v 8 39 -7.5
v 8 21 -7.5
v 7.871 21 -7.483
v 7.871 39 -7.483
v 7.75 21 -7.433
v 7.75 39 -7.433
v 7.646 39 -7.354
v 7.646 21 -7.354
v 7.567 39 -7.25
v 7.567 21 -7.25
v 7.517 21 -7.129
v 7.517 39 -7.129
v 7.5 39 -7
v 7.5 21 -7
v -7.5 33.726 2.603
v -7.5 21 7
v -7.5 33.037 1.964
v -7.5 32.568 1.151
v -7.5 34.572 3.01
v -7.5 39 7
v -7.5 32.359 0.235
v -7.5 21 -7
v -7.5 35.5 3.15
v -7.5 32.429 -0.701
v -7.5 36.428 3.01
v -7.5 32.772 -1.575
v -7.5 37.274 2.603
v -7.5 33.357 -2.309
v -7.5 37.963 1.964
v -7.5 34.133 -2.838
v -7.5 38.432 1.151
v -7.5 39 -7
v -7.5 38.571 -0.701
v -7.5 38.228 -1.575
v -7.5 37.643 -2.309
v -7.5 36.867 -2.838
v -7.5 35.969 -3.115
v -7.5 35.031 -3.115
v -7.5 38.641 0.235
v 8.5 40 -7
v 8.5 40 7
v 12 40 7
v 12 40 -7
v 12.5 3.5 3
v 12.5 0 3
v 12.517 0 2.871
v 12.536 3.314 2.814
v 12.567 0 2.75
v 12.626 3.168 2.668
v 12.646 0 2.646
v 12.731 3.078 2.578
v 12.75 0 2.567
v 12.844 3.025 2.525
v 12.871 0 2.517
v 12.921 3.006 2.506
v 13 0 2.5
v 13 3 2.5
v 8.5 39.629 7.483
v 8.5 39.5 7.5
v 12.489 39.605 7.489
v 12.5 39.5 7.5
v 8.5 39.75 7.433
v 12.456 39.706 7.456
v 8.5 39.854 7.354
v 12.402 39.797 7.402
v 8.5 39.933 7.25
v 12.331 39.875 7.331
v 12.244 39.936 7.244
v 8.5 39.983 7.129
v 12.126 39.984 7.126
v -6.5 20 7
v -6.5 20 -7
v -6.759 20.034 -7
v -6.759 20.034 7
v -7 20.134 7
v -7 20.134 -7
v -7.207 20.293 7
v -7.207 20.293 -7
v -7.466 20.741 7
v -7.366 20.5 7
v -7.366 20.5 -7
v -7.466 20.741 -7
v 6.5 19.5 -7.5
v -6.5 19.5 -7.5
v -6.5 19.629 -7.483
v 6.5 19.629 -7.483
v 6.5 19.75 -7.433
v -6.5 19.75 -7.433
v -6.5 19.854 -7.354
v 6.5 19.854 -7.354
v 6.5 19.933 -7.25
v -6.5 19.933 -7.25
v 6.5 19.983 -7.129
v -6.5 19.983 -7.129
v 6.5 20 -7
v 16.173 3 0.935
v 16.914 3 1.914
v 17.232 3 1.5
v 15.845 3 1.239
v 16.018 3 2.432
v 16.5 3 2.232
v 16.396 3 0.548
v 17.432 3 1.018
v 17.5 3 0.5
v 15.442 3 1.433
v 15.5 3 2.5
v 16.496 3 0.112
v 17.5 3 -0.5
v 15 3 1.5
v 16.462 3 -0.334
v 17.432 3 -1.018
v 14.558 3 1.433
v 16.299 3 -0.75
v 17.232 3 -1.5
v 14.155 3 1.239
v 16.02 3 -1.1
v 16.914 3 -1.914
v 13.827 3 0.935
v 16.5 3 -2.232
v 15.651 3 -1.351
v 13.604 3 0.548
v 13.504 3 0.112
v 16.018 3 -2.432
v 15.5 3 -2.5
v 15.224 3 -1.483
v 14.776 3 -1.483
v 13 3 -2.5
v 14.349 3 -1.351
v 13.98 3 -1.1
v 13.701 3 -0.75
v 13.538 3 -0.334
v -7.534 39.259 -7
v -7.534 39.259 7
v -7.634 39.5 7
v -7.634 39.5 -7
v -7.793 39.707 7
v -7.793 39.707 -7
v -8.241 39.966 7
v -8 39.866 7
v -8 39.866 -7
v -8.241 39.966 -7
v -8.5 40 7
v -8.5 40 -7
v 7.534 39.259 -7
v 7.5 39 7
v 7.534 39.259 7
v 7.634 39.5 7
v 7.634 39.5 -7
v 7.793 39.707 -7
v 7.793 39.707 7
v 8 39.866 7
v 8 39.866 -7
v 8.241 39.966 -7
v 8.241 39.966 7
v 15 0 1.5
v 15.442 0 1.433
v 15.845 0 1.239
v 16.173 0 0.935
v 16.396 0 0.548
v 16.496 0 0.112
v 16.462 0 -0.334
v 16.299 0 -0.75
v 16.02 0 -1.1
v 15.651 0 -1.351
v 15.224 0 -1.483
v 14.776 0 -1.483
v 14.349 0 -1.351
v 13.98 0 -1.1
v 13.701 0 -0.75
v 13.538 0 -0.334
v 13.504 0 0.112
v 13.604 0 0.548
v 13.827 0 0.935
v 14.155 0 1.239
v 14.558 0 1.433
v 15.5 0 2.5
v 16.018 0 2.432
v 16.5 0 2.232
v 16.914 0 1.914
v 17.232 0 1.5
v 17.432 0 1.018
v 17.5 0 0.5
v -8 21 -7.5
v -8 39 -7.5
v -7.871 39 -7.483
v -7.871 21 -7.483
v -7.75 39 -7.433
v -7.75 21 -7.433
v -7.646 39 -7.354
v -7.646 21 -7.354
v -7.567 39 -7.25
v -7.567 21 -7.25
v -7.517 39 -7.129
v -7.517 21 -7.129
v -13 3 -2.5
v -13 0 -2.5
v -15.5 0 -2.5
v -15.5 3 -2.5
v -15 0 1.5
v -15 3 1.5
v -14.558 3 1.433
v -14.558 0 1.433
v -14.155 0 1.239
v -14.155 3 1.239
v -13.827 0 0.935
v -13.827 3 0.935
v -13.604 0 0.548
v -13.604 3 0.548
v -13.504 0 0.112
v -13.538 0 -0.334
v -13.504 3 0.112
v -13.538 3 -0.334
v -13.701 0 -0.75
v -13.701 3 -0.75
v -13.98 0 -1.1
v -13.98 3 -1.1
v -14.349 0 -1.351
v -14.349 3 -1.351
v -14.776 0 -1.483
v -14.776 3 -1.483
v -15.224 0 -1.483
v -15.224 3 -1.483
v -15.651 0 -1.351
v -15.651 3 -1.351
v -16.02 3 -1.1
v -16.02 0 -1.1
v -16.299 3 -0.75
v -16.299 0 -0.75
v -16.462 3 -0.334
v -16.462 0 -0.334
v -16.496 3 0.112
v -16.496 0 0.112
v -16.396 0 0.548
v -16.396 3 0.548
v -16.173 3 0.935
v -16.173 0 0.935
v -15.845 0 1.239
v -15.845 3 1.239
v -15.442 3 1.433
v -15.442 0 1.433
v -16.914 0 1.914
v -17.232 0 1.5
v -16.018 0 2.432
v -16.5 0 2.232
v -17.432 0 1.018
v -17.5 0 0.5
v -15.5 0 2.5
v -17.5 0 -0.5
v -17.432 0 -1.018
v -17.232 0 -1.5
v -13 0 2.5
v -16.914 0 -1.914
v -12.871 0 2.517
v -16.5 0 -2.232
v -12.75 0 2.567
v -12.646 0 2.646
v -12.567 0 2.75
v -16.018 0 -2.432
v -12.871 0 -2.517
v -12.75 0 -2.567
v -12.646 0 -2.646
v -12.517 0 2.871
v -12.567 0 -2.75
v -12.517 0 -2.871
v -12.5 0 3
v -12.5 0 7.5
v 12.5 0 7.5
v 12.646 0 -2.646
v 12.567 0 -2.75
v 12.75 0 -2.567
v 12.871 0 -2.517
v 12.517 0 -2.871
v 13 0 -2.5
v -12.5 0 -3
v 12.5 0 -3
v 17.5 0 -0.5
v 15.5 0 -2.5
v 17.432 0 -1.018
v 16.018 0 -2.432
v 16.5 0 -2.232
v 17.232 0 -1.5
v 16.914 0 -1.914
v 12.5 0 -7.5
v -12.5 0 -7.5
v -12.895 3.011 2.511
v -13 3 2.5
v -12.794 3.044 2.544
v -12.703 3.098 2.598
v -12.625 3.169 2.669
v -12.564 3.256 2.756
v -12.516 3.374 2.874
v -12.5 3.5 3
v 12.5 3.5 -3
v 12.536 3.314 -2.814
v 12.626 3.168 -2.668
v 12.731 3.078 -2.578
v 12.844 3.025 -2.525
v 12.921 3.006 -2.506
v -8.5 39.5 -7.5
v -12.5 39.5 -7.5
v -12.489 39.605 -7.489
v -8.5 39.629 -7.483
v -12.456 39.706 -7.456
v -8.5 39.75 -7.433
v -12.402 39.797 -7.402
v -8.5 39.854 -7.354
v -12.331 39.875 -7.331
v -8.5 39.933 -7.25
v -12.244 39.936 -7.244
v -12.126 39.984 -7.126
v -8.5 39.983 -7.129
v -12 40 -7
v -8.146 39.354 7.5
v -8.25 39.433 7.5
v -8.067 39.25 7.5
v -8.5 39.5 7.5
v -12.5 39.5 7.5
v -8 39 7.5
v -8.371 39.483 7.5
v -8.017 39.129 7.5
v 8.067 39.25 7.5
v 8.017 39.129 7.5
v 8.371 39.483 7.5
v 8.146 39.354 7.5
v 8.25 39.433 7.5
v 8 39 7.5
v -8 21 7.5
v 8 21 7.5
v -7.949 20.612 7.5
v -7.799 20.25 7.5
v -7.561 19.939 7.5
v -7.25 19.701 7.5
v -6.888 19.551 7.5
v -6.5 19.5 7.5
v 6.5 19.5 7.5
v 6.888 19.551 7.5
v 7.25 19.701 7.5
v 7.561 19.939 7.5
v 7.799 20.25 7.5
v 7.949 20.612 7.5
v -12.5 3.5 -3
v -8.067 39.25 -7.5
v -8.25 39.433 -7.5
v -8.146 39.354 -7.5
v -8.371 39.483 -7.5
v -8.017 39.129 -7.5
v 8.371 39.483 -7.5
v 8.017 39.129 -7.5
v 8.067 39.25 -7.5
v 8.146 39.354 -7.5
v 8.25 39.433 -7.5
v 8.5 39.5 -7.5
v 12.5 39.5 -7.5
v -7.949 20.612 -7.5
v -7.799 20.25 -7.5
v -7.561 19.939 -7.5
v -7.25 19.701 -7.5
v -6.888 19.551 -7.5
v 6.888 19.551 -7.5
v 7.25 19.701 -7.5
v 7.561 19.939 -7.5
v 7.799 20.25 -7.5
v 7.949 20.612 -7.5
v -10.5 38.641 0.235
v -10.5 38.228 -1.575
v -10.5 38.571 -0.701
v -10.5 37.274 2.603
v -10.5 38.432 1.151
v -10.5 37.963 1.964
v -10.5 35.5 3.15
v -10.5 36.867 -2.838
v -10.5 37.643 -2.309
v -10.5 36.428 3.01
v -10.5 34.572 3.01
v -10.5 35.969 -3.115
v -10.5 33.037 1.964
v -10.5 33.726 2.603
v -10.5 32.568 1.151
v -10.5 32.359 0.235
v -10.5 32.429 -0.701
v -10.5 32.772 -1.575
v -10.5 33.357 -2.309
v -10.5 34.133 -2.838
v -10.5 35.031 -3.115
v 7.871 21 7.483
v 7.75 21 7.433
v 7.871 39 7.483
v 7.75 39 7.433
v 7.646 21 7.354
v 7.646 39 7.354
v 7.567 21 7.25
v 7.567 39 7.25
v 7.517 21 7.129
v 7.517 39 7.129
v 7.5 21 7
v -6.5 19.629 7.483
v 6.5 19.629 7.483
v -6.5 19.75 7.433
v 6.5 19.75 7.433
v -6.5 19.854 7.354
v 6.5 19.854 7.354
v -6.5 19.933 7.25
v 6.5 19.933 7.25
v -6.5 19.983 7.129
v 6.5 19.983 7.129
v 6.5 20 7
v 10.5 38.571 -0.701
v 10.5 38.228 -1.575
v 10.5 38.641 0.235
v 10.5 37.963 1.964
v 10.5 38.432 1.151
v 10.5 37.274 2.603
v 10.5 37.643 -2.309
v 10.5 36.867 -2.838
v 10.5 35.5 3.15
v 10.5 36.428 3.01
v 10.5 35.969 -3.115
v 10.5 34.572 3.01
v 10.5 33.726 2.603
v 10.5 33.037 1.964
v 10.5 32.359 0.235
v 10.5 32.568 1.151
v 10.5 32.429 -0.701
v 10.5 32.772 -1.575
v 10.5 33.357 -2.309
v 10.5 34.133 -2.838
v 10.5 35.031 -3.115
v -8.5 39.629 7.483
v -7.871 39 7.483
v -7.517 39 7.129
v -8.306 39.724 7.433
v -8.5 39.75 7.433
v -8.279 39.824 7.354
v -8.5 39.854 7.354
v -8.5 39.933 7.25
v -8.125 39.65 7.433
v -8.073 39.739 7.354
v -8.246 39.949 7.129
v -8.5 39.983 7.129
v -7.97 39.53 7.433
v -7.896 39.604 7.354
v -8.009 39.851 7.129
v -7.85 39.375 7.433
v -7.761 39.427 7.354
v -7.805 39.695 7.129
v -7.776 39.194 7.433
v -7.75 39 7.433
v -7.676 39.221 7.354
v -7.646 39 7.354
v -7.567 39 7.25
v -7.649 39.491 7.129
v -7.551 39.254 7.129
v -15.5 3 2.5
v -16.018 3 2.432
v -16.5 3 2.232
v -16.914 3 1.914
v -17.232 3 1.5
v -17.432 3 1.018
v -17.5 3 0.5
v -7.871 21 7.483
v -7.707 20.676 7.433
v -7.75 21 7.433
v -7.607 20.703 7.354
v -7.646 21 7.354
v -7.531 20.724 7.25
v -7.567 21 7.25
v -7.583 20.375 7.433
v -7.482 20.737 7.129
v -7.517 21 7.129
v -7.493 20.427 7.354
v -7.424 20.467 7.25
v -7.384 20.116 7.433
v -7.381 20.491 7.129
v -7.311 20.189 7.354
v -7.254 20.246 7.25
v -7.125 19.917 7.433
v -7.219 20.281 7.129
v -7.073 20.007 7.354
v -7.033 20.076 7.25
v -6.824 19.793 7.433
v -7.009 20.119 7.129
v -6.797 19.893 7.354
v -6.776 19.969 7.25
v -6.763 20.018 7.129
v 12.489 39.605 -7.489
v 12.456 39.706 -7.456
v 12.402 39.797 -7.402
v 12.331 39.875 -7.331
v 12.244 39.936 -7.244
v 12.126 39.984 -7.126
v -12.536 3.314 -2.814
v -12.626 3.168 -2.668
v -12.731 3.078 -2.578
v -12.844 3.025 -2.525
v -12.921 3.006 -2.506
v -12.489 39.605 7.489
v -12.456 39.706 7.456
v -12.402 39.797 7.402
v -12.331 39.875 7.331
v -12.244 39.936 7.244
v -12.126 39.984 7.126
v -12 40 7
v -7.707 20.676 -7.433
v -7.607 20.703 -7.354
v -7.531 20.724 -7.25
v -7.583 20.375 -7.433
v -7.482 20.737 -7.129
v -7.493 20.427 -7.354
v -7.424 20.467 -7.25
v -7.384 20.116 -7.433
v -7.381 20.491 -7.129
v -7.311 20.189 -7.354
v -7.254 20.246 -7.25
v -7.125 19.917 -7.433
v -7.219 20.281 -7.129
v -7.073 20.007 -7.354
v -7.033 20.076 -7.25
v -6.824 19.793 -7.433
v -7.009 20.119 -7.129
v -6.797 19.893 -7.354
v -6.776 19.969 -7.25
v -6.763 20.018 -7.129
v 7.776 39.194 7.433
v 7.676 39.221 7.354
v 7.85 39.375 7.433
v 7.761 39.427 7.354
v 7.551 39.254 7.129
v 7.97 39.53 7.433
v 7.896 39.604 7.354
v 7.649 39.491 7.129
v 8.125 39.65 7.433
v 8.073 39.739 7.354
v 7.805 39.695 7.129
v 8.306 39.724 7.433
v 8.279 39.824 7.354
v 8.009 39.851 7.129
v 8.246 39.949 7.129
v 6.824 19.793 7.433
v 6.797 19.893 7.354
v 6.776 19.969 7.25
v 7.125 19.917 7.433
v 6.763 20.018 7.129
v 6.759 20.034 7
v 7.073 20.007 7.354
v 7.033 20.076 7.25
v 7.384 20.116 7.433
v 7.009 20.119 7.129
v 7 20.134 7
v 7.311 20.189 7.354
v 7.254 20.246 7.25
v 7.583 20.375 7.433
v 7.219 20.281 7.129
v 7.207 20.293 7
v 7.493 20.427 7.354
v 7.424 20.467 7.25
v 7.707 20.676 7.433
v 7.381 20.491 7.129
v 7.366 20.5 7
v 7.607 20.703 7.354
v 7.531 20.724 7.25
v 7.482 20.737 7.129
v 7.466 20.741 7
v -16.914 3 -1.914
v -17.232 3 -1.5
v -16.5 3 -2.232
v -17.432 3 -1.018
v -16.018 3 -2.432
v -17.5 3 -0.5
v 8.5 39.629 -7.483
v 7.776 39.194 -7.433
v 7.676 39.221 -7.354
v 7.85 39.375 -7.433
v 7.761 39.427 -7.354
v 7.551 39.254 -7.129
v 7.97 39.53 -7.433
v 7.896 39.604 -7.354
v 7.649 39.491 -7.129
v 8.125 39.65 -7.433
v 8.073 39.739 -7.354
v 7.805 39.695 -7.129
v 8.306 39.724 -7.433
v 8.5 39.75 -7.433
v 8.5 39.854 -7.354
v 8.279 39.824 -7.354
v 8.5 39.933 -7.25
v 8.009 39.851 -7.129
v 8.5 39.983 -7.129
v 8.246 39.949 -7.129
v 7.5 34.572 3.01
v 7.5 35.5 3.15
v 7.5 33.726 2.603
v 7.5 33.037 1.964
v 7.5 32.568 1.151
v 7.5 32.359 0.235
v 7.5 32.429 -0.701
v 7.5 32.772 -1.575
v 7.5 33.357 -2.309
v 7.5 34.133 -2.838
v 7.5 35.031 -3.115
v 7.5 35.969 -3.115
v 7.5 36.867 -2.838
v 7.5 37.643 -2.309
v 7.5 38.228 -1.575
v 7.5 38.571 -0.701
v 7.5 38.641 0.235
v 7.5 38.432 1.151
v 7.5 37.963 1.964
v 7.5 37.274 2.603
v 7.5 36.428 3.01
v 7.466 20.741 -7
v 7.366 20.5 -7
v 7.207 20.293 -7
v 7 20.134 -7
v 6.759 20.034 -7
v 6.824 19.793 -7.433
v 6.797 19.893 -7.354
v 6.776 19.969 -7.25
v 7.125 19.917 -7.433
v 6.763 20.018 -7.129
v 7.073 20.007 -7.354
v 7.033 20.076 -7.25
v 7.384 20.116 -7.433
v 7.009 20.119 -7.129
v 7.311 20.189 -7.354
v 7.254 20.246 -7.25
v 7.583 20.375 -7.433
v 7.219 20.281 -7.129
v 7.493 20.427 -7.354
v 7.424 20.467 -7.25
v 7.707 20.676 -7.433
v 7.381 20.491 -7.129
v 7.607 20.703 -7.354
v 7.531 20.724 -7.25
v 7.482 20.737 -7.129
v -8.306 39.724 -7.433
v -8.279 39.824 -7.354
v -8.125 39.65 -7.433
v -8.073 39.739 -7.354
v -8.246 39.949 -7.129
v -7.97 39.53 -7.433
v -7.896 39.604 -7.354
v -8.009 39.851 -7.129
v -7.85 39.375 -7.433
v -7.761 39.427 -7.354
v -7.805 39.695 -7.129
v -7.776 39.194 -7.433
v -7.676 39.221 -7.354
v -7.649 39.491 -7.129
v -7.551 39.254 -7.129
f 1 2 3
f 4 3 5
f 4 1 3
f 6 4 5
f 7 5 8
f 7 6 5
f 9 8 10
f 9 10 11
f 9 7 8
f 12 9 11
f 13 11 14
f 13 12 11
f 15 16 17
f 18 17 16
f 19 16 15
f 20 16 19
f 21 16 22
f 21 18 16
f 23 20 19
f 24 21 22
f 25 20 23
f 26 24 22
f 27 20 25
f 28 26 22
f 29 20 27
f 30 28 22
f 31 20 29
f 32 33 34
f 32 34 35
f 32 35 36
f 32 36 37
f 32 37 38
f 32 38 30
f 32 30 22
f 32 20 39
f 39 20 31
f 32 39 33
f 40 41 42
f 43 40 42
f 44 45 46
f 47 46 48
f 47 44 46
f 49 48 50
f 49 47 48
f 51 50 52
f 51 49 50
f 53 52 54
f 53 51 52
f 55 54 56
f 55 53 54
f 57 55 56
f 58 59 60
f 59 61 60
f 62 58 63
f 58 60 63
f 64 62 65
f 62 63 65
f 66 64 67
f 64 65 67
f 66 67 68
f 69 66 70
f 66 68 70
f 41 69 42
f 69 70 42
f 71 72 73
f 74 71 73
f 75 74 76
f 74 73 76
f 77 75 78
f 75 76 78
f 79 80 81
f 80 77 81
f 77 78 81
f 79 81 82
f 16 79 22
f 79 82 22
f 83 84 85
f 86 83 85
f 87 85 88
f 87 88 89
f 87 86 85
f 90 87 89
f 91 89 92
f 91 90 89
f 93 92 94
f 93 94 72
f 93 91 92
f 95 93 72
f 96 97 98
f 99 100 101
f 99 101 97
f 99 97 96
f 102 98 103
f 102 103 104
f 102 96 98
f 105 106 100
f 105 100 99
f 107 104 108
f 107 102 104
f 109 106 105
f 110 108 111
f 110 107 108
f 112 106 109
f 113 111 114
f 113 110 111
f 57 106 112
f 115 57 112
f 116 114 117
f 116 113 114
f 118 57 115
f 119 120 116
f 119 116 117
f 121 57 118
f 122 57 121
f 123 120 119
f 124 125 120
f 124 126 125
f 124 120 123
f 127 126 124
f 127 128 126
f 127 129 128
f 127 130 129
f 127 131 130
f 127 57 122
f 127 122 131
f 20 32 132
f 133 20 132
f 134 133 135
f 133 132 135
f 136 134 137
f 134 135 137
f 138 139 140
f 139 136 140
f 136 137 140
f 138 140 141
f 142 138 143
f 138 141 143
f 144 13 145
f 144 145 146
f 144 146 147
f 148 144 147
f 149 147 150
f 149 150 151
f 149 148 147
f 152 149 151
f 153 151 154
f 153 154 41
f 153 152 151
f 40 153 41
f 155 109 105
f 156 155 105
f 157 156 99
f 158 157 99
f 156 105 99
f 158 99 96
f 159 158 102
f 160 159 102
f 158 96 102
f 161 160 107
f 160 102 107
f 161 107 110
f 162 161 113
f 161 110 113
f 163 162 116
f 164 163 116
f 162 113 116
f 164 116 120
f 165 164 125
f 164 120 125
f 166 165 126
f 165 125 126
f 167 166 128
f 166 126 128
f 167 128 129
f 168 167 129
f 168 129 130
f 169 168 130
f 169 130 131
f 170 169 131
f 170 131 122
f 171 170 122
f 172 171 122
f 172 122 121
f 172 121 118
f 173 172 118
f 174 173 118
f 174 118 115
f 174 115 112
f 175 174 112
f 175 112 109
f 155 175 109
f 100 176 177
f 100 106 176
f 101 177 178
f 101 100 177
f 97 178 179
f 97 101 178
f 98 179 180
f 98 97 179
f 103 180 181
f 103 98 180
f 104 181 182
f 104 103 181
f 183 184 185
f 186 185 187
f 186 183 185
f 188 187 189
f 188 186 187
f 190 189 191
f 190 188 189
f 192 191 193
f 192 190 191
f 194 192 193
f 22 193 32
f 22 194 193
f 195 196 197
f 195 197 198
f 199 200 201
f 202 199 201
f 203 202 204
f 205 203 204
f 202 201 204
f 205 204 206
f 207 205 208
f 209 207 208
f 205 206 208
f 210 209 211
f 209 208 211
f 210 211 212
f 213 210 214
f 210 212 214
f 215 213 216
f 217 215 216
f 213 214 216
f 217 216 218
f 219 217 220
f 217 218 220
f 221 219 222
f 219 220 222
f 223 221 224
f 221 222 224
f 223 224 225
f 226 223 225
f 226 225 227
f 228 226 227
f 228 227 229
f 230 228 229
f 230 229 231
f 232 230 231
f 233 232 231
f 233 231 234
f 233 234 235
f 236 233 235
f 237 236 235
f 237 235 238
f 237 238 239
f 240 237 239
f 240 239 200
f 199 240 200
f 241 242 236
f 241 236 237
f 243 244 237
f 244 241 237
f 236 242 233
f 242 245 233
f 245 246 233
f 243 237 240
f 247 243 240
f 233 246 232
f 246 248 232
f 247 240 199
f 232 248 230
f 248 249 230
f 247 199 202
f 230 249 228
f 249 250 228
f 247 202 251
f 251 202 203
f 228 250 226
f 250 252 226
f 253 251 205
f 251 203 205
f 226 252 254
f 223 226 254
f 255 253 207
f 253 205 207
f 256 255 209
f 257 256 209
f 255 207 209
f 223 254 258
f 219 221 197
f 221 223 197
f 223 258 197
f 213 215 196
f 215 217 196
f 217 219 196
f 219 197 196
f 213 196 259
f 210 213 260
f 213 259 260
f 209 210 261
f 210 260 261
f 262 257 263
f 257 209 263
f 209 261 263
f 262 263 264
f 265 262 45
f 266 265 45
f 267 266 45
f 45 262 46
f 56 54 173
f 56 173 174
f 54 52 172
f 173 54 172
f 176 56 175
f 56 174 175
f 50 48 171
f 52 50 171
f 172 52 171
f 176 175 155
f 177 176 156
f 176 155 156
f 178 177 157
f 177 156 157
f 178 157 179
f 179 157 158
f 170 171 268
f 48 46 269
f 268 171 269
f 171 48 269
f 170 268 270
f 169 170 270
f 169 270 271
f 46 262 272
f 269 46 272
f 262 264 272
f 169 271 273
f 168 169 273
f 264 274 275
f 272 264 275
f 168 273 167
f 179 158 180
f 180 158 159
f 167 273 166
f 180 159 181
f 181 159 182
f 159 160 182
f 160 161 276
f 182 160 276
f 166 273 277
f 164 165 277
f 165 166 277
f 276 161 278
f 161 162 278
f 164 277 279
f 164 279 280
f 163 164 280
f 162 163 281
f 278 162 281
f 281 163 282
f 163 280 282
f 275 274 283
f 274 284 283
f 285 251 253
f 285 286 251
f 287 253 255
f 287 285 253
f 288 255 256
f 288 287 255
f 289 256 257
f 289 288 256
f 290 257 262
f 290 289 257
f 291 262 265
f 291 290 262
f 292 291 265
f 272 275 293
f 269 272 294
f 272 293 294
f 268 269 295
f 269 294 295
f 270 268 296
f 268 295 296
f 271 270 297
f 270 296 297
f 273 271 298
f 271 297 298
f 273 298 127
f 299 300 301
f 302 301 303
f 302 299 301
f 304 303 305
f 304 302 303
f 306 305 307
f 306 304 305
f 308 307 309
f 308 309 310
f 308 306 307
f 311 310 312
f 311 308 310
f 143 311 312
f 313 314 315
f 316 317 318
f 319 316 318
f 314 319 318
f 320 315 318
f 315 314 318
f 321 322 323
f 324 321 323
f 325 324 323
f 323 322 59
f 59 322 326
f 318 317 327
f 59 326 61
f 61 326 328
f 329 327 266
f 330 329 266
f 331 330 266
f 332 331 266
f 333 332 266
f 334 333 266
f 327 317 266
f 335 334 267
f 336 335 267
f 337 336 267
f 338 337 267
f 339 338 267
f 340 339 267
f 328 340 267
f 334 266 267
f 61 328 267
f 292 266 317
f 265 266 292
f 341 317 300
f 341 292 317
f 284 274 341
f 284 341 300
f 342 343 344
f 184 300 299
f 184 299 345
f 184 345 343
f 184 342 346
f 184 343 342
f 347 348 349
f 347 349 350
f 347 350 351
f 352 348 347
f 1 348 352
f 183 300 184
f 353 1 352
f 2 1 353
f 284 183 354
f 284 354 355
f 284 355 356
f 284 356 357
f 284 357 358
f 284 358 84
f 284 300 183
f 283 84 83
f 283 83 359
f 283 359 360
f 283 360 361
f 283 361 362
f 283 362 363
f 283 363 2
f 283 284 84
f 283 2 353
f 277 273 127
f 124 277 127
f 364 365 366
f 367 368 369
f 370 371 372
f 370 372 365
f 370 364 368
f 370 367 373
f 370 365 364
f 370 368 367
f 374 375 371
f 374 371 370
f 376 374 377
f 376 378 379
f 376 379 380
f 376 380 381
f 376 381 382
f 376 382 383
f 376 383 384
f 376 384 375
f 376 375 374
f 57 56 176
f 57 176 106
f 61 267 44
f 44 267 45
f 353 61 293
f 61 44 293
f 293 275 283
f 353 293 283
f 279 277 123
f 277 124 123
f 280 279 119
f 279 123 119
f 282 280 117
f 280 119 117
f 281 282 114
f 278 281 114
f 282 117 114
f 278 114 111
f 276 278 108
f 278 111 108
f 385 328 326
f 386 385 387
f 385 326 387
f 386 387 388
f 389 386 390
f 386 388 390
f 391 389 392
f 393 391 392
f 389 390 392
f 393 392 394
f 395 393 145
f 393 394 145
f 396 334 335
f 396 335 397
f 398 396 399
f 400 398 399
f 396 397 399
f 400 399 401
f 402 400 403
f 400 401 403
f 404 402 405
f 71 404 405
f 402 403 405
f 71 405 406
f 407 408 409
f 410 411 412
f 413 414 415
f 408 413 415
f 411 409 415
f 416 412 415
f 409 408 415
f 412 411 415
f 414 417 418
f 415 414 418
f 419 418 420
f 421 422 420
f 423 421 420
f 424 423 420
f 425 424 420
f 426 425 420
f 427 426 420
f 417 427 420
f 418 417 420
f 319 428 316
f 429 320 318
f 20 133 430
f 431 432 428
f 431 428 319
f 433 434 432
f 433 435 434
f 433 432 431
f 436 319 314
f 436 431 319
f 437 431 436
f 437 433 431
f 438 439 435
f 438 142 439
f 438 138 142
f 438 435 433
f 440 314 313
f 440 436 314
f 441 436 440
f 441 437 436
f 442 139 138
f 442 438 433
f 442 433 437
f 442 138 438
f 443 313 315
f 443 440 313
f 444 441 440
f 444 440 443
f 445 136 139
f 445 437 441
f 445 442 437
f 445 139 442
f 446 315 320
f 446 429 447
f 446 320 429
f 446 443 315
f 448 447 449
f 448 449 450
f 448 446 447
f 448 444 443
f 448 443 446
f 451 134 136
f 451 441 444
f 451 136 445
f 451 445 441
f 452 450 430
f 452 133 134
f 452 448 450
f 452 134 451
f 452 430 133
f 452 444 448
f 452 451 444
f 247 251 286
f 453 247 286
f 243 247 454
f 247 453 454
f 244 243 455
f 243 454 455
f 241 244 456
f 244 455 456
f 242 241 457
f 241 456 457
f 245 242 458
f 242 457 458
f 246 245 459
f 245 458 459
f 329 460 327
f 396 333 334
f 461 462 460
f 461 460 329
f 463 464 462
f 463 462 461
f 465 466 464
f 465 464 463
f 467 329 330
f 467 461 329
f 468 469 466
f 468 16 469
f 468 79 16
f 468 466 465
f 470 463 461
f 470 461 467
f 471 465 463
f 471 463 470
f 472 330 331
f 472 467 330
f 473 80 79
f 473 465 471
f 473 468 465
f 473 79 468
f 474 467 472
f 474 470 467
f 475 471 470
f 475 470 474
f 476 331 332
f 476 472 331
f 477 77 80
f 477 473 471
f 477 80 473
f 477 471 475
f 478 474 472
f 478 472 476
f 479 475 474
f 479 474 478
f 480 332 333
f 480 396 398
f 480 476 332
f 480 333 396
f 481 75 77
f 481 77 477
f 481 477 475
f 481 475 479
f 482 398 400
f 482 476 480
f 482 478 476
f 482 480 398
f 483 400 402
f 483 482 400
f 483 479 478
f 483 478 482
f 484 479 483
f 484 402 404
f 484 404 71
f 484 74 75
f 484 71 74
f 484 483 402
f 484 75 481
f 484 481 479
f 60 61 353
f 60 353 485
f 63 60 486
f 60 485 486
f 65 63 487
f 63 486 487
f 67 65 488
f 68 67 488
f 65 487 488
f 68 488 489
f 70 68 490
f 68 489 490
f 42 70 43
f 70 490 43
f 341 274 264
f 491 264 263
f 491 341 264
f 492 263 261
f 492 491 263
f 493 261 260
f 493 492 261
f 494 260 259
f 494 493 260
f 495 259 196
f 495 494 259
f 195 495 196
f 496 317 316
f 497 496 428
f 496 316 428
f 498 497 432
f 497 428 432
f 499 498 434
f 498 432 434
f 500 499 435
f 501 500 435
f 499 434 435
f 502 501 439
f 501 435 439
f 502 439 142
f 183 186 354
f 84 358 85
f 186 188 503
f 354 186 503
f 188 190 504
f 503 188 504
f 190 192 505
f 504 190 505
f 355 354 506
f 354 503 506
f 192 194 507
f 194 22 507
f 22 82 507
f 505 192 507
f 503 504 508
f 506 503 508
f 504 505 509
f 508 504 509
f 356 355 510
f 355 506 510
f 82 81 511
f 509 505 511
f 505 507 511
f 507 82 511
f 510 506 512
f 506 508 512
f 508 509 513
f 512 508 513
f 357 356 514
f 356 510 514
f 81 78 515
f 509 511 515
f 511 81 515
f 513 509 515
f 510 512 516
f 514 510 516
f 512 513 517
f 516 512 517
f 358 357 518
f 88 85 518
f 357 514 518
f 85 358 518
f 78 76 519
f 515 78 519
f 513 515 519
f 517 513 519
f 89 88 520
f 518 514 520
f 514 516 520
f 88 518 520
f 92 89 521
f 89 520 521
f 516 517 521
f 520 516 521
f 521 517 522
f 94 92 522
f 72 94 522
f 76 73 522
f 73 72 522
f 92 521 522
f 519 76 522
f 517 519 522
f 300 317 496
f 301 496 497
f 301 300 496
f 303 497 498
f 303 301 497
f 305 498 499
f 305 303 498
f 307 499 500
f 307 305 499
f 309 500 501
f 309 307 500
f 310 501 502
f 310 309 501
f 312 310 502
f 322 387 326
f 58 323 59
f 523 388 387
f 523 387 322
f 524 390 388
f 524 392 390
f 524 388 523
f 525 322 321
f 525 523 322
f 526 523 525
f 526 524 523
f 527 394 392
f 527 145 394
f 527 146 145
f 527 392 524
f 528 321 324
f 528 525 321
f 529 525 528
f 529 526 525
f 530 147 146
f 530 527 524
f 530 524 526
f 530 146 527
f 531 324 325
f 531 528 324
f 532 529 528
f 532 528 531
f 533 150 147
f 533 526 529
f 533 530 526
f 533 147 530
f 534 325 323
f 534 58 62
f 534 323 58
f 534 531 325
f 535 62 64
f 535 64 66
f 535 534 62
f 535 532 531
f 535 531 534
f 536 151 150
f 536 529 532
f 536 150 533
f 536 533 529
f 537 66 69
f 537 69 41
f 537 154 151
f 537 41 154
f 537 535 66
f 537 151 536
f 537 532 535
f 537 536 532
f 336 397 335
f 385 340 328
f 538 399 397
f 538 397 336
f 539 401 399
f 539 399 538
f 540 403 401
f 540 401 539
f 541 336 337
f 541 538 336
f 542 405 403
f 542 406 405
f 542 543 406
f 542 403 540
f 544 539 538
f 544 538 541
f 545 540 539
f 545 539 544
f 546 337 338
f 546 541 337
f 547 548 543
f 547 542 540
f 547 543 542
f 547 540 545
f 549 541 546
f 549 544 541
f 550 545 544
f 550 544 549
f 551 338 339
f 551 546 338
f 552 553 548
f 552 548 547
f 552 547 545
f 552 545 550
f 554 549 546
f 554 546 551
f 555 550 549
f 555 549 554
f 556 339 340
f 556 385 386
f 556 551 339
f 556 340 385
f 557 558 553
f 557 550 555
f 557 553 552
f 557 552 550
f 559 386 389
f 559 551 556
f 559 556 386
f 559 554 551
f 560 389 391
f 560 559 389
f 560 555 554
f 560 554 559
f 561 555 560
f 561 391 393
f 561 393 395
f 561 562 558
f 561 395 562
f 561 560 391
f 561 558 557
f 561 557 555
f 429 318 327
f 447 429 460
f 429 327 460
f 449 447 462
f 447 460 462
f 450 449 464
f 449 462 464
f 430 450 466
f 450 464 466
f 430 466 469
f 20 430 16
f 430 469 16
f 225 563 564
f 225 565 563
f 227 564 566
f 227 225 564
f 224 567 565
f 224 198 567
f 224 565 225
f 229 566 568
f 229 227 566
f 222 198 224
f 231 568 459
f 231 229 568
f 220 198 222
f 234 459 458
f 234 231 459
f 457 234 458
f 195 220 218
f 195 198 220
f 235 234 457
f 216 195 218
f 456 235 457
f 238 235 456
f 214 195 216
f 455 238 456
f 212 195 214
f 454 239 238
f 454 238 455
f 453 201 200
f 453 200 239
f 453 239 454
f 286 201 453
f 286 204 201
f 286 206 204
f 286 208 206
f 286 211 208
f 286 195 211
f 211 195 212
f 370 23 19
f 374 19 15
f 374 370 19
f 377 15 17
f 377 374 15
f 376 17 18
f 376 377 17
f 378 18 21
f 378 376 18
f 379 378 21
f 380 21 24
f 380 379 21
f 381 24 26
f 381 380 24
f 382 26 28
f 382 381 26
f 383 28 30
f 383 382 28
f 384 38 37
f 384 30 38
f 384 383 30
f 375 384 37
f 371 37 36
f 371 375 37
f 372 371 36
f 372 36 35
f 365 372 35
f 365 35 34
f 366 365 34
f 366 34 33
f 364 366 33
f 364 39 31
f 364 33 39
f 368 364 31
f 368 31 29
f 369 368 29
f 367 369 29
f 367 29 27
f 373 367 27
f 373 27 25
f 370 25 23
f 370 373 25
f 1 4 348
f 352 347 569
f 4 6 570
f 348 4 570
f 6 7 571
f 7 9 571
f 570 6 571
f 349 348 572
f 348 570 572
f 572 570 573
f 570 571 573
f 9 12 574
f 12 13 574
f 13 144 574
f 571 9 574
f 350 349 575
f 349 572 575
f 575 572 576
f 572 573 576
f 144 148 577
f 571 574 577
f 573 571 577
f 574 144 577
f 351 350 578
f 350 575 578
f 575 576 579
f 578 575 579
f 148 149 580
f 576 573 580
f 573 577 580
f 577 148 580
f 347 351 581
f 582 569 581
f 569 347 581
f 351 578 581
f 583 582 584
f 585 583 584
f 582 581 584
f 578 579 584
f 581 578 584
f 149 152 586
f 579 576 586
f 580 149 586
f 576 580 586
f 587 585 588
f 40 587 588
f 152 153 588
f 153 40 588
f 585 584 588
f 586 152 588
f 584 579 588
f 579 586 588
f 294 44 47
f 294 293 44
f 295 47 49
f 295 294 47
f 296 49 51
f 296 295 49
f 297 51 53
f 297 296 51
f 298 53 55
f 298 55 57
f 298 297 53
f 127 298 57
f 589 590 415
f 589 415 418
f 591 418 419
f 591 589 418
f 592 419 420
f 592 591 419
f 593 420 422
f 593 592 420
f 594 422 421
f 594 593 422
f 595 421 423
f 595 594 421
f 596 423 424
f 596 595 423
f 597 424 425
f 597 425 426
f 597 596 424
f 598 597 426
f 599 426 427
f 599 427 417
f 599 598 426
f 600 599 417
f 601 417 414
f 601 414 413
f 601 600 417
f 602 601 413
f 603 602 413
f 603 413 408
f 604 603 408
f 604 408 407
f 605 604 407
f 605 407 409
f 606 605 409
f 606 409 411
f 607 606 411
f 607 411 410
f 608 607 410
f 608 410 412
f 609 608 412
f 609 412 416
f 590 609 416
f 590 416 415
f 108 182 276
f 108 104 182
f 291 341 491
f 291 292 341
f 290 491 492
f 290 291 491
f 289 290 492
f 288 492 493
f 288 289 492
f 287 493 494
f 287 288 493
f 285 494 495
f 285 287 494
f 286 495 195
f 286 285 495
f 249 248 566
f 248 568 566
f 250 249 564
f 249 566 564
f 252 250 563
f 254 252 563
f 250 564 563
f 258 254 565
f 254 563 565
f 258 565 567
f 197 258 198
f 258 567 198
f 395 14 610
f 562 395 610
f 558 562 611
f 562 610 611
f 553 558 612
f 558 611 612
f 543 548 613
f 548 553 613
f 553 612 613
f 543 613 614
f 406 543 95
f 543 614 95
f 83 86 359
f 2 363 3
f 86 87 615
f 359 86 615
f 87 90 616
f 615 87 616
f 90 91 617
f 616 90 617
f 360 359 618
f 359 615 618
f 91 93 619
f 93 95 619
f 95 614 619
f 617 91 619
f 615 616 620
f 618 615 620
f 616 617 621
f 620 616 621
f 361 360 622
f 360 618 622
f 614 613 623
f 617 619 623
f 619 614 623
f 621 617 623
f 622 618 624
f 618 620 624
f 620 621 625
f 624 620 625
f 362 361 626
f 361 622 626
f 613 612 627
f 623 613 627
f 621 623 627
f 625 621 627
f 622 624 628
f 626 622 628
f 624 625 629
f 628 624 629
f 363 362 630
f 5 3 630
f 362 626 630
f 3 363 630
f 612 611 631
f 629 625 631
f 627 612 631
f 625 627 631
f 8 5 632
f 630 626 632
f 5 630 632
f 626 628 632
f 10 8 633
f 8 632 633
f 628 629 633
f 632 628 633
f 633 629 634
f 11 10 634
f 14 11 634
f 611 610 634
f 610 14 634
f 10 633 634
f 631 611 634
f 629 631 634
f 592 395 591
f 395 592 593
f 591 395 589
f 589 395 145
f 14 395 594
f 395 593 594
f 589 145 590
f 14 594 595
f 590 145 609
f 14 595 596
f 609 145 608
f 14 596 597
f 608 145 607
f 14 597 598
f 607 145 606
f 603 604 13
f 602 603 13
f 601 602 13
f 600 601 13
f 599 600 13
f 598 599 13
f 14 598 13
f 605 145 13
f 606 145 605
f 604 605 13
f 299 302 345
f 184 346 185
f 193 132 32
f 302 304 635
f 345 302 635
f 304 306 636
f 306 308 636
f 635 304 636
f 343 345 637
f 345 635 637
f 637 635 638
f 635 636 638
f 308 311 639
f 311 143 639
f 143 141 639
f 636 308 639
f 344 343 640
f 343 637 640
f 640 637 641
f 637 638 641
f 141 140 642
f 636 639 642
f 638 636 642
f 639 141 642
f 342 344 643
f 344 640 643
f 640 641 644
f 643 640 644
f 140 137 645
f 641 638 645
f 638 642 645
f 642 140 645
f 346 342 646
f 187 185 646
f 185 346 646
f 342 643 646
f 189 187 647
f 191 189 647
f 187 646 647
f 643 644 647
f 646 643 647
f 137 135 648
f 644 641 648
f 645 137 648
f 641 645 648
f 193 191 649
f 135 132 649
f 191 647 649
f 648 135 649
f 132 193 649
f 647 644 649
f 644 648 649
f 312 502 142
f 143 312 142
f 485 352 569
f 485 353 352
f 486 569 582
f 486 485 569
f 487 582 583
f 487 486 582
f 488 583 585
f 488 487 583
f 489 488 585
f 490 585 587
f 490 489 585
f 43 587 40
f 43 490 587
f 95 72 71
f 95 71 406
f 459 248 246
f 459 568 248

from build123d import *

# Parameters (mm, degrees)
CROQUIS2_W                 = 25
CROQUIS2_H                 = 15
SALIENTE_EXTRUIR1_DEPTH    = 40
CROQUIS3_W                 = 15
CROQUIS3_H                 = 15
CORTAR_EXTRUIR1_DEPTH      = 20
REDONDEO1_R                = 1
REDONDEO2_R                = 1
CORTAR_EXTRUIR2_DEPTH      = 18
CORTAR_EXTRUIR2_DEPTH_BACK = 3
CROQUIS4_R                 = 3.15
CROQUIS6_W                 = 5
CROQUIS6_H                 = 3
SALIENTE_EXTRUIR2_DEPTH    = 5
REDONDEO3_R                = 2
CROQUIS8_R                 = 1.5
CORTAR_EXTRUIR3_DEPTH      = 15
CROQUIS9_W                 = 5
CROQUIS9_H                 = 3
SALIENTE_EXTRUIR3_DEPTH    = 5
CORTAR_EXTRUIR4_REACH      = 43.611
CROQUIS10_R                = 1.5
REDONDEO4_R                = 2
REDONDEO5_R                = 0.5
REDONDEO6_R                = 0.5


with BuildPart() as part:
    # Croquis2 → Saliente-Extruir1 (new body)
    with BuildSketch(Plane(origin=(0, 0, 0), x_dir=(1, 0, 0), z_dir=(0, 1, 0))):
        Rectangle(CROQUIS2_W, CROQUIS2_H)
    extrude(amount=SALIENTE_EXTRUIR1_DEPTH)

    # Croquis3 → Cortar-Extruir1 (cut)
    with BuildSketch(Plane(origin=(0, 40, 0), x_dir=(1, 0, 0), z_dir=(0, 1, 0))):
        Rectangle(CROQUIS3_W, CROQUIS3_H)
    extrude(amount=-CORTAR_EXTRUIR1_DEPTH, mode=Mode.SUBTRACT)

    # Redondeo1
    redondeo1_edges = [part.edges().sort_by_distance(p)[0] for p in [
        (7.5, 20, 0),
        (-7.5, 20, 0),
    ]]
    fillet(redondeo1_edges, radius=REDONDEO1_R)

    # Redondeo2
    redondeo2_edges = [part.edges().sort_by_distance(p)[0] for p in [
        (7.5, 40, 0),
        (-7.5, 40, 0),
    ]]
    fillet(redondeo2_edges, radius=REDONDEO2_R)

    # Croquis4 → Cortar-Extruir2 (cut, two sides: drawn at the far end of the back side and taken through both)
    with BuildSketch(Plane(origin=(-7.5, 0, 0), x_dir=(0, 0, -1), z_dir=(1, 0, 0)).offset(-CORTAR_EXTRUIR2_DEPTH_BACK)):
        with Locations(Location((0, 35.5, 0), (0, 0, 180))):
            Circle(CROQUIS4_R)
    extrude(amount=CORTAR_EXTRUIR2_DEPTH + CORTAR_EXTRUIR2_DEPTH_BACK, mode=Mode.SUBTRACT)

    # Croquis6 → Saliente-Extruir2 (add)
    with BuildSketch(Plane(origin=(12.5, 0, 0), x_dir=(0, 0, -1), z_dir=(1, 0, 0))):
        with Locations((0, 1.5)):
            Rectangle(CROQUIS6_W, CROQUIS6_H)
    extrude(amount=SALIENTE_EXTRUIR2_DEPTH)

    # Redondeo3
    redondeo3_edges = [part.edges().sort_by_distance(p)[0] for p in [
        (17.5, 1.5, -2.5),
        (17.5, 1.5, 2.5),
    ]]
    fillet(redondeo3_edges, radius=REDONDEO3_R)

    # Croquis8 → Cortar-Extruir3 (cut)
    with BuildSketch(Plane(origin=(0, 3, 0), x_dir=(1, 0, 0), z_dir=(0, 1, 0))):
        with Locations(Location((15, 0, 0), (0, 0, 270))):
            Circle(CROQUIS8_R)
    extrude(amount=-CORTAR_EXTRUIR3_DEPTH, mode=Mode.SUBTRACT)

    # Croquis9 → Saliente-Extruir3 (add)
    with BuildSketch(Plane.ZY.offset(12.5)):
        with Locations((0, 1.5)):
            Rectangle(CROQUIS9_W, CROQUIS9_H)
    extrude(amount=SALIENTE_EXTRUIR3_DEPTH)

    # Croquis10 → Cortar-Extruir4 (cut, up to next)
    with BuildSketch(Plane(origin=(0, 3, 0), x_dir=(1, 0, 0), z_dir=(0, 1, 0)), mode=Mode.PRIVATE) as cortar_extruir4_sk1:
        with Locations(Location((-15, 0, 0), (0, 0, 270))):
            Circle(CROQUIS10_R)
    cortar_extruir4_tool1 = extrude(cortar_extruir4_sk1.sketch, amount=-CORTAR_EXTRUIR4_REACH, mode=Mode.PRIVATE) & part.part
    add(cortar_extruir4_tool1.solids().sort_by_distance((-15, 3, 0))[0], mode=Mode.SUBTRACT)

    # Redondeo4
    redondeo4_edges = [part.edges().sort_by_distance(p)[0] for p in [
        (-17.5, 1.5, 2.5),
        (-17.5, 1.5, -2.5),
    ]]
    fillet(redondeo4_edges, radius=REDONDEO4_R)

    # Redondeo5
    redondeo5_edges = [part.edges().sort_by_distance(p)[0] for p in [
        (12.5, 1.5, -2.5),
        (12.5, 3, 0),
        (12.5, 1.5, 2.5),
        (-12.5, 1.5, 2.5),
        (-12.5, 3, 0),
        (-12.5, 1.5, -2.5),
    ]]
    fillet(redondeo5_edges, radius=REDONDEO5_R)

    # Redondeo6
    redondeo6_edges = [part.edges().sort_by_distance(p)[0] for p in [
        (-12.5, 40, 0),
        (-10.5, 40, 7.5),
        (0, 20, -7.5),
        (0, 20, 7.5),
        (7.5, 30, -7.5),
        (7.5, 30, 7.5),
        (-7.5, 30, 7.5),
        (-7.5, 30, -7.5),
        (7.207106781, 20.292893219, -7.5),
        (7.207106781, 20.292893219, 7.5),
        (-7.207106781, 20.292893219, 7.5),
        (-7.207106781, 20.292893219, -7.5),
        (10.5, 40, 7.5),
        (7.792893219, 39.707106781, 7.5),
        (-7.792893219, 39.707106781, 7.5),
        (-10.5, 40, -7.5),
        (7.792893219, 39.707106781, -7.5),
        (-7.792893219, 39.707106781, -7.5),
        (12.5, 40, 0),
        (10.5, 40, -7.5),
    ]]
    fillet(redondeo6_edges, radius=REDONDEO6_R)


solid = part.part
